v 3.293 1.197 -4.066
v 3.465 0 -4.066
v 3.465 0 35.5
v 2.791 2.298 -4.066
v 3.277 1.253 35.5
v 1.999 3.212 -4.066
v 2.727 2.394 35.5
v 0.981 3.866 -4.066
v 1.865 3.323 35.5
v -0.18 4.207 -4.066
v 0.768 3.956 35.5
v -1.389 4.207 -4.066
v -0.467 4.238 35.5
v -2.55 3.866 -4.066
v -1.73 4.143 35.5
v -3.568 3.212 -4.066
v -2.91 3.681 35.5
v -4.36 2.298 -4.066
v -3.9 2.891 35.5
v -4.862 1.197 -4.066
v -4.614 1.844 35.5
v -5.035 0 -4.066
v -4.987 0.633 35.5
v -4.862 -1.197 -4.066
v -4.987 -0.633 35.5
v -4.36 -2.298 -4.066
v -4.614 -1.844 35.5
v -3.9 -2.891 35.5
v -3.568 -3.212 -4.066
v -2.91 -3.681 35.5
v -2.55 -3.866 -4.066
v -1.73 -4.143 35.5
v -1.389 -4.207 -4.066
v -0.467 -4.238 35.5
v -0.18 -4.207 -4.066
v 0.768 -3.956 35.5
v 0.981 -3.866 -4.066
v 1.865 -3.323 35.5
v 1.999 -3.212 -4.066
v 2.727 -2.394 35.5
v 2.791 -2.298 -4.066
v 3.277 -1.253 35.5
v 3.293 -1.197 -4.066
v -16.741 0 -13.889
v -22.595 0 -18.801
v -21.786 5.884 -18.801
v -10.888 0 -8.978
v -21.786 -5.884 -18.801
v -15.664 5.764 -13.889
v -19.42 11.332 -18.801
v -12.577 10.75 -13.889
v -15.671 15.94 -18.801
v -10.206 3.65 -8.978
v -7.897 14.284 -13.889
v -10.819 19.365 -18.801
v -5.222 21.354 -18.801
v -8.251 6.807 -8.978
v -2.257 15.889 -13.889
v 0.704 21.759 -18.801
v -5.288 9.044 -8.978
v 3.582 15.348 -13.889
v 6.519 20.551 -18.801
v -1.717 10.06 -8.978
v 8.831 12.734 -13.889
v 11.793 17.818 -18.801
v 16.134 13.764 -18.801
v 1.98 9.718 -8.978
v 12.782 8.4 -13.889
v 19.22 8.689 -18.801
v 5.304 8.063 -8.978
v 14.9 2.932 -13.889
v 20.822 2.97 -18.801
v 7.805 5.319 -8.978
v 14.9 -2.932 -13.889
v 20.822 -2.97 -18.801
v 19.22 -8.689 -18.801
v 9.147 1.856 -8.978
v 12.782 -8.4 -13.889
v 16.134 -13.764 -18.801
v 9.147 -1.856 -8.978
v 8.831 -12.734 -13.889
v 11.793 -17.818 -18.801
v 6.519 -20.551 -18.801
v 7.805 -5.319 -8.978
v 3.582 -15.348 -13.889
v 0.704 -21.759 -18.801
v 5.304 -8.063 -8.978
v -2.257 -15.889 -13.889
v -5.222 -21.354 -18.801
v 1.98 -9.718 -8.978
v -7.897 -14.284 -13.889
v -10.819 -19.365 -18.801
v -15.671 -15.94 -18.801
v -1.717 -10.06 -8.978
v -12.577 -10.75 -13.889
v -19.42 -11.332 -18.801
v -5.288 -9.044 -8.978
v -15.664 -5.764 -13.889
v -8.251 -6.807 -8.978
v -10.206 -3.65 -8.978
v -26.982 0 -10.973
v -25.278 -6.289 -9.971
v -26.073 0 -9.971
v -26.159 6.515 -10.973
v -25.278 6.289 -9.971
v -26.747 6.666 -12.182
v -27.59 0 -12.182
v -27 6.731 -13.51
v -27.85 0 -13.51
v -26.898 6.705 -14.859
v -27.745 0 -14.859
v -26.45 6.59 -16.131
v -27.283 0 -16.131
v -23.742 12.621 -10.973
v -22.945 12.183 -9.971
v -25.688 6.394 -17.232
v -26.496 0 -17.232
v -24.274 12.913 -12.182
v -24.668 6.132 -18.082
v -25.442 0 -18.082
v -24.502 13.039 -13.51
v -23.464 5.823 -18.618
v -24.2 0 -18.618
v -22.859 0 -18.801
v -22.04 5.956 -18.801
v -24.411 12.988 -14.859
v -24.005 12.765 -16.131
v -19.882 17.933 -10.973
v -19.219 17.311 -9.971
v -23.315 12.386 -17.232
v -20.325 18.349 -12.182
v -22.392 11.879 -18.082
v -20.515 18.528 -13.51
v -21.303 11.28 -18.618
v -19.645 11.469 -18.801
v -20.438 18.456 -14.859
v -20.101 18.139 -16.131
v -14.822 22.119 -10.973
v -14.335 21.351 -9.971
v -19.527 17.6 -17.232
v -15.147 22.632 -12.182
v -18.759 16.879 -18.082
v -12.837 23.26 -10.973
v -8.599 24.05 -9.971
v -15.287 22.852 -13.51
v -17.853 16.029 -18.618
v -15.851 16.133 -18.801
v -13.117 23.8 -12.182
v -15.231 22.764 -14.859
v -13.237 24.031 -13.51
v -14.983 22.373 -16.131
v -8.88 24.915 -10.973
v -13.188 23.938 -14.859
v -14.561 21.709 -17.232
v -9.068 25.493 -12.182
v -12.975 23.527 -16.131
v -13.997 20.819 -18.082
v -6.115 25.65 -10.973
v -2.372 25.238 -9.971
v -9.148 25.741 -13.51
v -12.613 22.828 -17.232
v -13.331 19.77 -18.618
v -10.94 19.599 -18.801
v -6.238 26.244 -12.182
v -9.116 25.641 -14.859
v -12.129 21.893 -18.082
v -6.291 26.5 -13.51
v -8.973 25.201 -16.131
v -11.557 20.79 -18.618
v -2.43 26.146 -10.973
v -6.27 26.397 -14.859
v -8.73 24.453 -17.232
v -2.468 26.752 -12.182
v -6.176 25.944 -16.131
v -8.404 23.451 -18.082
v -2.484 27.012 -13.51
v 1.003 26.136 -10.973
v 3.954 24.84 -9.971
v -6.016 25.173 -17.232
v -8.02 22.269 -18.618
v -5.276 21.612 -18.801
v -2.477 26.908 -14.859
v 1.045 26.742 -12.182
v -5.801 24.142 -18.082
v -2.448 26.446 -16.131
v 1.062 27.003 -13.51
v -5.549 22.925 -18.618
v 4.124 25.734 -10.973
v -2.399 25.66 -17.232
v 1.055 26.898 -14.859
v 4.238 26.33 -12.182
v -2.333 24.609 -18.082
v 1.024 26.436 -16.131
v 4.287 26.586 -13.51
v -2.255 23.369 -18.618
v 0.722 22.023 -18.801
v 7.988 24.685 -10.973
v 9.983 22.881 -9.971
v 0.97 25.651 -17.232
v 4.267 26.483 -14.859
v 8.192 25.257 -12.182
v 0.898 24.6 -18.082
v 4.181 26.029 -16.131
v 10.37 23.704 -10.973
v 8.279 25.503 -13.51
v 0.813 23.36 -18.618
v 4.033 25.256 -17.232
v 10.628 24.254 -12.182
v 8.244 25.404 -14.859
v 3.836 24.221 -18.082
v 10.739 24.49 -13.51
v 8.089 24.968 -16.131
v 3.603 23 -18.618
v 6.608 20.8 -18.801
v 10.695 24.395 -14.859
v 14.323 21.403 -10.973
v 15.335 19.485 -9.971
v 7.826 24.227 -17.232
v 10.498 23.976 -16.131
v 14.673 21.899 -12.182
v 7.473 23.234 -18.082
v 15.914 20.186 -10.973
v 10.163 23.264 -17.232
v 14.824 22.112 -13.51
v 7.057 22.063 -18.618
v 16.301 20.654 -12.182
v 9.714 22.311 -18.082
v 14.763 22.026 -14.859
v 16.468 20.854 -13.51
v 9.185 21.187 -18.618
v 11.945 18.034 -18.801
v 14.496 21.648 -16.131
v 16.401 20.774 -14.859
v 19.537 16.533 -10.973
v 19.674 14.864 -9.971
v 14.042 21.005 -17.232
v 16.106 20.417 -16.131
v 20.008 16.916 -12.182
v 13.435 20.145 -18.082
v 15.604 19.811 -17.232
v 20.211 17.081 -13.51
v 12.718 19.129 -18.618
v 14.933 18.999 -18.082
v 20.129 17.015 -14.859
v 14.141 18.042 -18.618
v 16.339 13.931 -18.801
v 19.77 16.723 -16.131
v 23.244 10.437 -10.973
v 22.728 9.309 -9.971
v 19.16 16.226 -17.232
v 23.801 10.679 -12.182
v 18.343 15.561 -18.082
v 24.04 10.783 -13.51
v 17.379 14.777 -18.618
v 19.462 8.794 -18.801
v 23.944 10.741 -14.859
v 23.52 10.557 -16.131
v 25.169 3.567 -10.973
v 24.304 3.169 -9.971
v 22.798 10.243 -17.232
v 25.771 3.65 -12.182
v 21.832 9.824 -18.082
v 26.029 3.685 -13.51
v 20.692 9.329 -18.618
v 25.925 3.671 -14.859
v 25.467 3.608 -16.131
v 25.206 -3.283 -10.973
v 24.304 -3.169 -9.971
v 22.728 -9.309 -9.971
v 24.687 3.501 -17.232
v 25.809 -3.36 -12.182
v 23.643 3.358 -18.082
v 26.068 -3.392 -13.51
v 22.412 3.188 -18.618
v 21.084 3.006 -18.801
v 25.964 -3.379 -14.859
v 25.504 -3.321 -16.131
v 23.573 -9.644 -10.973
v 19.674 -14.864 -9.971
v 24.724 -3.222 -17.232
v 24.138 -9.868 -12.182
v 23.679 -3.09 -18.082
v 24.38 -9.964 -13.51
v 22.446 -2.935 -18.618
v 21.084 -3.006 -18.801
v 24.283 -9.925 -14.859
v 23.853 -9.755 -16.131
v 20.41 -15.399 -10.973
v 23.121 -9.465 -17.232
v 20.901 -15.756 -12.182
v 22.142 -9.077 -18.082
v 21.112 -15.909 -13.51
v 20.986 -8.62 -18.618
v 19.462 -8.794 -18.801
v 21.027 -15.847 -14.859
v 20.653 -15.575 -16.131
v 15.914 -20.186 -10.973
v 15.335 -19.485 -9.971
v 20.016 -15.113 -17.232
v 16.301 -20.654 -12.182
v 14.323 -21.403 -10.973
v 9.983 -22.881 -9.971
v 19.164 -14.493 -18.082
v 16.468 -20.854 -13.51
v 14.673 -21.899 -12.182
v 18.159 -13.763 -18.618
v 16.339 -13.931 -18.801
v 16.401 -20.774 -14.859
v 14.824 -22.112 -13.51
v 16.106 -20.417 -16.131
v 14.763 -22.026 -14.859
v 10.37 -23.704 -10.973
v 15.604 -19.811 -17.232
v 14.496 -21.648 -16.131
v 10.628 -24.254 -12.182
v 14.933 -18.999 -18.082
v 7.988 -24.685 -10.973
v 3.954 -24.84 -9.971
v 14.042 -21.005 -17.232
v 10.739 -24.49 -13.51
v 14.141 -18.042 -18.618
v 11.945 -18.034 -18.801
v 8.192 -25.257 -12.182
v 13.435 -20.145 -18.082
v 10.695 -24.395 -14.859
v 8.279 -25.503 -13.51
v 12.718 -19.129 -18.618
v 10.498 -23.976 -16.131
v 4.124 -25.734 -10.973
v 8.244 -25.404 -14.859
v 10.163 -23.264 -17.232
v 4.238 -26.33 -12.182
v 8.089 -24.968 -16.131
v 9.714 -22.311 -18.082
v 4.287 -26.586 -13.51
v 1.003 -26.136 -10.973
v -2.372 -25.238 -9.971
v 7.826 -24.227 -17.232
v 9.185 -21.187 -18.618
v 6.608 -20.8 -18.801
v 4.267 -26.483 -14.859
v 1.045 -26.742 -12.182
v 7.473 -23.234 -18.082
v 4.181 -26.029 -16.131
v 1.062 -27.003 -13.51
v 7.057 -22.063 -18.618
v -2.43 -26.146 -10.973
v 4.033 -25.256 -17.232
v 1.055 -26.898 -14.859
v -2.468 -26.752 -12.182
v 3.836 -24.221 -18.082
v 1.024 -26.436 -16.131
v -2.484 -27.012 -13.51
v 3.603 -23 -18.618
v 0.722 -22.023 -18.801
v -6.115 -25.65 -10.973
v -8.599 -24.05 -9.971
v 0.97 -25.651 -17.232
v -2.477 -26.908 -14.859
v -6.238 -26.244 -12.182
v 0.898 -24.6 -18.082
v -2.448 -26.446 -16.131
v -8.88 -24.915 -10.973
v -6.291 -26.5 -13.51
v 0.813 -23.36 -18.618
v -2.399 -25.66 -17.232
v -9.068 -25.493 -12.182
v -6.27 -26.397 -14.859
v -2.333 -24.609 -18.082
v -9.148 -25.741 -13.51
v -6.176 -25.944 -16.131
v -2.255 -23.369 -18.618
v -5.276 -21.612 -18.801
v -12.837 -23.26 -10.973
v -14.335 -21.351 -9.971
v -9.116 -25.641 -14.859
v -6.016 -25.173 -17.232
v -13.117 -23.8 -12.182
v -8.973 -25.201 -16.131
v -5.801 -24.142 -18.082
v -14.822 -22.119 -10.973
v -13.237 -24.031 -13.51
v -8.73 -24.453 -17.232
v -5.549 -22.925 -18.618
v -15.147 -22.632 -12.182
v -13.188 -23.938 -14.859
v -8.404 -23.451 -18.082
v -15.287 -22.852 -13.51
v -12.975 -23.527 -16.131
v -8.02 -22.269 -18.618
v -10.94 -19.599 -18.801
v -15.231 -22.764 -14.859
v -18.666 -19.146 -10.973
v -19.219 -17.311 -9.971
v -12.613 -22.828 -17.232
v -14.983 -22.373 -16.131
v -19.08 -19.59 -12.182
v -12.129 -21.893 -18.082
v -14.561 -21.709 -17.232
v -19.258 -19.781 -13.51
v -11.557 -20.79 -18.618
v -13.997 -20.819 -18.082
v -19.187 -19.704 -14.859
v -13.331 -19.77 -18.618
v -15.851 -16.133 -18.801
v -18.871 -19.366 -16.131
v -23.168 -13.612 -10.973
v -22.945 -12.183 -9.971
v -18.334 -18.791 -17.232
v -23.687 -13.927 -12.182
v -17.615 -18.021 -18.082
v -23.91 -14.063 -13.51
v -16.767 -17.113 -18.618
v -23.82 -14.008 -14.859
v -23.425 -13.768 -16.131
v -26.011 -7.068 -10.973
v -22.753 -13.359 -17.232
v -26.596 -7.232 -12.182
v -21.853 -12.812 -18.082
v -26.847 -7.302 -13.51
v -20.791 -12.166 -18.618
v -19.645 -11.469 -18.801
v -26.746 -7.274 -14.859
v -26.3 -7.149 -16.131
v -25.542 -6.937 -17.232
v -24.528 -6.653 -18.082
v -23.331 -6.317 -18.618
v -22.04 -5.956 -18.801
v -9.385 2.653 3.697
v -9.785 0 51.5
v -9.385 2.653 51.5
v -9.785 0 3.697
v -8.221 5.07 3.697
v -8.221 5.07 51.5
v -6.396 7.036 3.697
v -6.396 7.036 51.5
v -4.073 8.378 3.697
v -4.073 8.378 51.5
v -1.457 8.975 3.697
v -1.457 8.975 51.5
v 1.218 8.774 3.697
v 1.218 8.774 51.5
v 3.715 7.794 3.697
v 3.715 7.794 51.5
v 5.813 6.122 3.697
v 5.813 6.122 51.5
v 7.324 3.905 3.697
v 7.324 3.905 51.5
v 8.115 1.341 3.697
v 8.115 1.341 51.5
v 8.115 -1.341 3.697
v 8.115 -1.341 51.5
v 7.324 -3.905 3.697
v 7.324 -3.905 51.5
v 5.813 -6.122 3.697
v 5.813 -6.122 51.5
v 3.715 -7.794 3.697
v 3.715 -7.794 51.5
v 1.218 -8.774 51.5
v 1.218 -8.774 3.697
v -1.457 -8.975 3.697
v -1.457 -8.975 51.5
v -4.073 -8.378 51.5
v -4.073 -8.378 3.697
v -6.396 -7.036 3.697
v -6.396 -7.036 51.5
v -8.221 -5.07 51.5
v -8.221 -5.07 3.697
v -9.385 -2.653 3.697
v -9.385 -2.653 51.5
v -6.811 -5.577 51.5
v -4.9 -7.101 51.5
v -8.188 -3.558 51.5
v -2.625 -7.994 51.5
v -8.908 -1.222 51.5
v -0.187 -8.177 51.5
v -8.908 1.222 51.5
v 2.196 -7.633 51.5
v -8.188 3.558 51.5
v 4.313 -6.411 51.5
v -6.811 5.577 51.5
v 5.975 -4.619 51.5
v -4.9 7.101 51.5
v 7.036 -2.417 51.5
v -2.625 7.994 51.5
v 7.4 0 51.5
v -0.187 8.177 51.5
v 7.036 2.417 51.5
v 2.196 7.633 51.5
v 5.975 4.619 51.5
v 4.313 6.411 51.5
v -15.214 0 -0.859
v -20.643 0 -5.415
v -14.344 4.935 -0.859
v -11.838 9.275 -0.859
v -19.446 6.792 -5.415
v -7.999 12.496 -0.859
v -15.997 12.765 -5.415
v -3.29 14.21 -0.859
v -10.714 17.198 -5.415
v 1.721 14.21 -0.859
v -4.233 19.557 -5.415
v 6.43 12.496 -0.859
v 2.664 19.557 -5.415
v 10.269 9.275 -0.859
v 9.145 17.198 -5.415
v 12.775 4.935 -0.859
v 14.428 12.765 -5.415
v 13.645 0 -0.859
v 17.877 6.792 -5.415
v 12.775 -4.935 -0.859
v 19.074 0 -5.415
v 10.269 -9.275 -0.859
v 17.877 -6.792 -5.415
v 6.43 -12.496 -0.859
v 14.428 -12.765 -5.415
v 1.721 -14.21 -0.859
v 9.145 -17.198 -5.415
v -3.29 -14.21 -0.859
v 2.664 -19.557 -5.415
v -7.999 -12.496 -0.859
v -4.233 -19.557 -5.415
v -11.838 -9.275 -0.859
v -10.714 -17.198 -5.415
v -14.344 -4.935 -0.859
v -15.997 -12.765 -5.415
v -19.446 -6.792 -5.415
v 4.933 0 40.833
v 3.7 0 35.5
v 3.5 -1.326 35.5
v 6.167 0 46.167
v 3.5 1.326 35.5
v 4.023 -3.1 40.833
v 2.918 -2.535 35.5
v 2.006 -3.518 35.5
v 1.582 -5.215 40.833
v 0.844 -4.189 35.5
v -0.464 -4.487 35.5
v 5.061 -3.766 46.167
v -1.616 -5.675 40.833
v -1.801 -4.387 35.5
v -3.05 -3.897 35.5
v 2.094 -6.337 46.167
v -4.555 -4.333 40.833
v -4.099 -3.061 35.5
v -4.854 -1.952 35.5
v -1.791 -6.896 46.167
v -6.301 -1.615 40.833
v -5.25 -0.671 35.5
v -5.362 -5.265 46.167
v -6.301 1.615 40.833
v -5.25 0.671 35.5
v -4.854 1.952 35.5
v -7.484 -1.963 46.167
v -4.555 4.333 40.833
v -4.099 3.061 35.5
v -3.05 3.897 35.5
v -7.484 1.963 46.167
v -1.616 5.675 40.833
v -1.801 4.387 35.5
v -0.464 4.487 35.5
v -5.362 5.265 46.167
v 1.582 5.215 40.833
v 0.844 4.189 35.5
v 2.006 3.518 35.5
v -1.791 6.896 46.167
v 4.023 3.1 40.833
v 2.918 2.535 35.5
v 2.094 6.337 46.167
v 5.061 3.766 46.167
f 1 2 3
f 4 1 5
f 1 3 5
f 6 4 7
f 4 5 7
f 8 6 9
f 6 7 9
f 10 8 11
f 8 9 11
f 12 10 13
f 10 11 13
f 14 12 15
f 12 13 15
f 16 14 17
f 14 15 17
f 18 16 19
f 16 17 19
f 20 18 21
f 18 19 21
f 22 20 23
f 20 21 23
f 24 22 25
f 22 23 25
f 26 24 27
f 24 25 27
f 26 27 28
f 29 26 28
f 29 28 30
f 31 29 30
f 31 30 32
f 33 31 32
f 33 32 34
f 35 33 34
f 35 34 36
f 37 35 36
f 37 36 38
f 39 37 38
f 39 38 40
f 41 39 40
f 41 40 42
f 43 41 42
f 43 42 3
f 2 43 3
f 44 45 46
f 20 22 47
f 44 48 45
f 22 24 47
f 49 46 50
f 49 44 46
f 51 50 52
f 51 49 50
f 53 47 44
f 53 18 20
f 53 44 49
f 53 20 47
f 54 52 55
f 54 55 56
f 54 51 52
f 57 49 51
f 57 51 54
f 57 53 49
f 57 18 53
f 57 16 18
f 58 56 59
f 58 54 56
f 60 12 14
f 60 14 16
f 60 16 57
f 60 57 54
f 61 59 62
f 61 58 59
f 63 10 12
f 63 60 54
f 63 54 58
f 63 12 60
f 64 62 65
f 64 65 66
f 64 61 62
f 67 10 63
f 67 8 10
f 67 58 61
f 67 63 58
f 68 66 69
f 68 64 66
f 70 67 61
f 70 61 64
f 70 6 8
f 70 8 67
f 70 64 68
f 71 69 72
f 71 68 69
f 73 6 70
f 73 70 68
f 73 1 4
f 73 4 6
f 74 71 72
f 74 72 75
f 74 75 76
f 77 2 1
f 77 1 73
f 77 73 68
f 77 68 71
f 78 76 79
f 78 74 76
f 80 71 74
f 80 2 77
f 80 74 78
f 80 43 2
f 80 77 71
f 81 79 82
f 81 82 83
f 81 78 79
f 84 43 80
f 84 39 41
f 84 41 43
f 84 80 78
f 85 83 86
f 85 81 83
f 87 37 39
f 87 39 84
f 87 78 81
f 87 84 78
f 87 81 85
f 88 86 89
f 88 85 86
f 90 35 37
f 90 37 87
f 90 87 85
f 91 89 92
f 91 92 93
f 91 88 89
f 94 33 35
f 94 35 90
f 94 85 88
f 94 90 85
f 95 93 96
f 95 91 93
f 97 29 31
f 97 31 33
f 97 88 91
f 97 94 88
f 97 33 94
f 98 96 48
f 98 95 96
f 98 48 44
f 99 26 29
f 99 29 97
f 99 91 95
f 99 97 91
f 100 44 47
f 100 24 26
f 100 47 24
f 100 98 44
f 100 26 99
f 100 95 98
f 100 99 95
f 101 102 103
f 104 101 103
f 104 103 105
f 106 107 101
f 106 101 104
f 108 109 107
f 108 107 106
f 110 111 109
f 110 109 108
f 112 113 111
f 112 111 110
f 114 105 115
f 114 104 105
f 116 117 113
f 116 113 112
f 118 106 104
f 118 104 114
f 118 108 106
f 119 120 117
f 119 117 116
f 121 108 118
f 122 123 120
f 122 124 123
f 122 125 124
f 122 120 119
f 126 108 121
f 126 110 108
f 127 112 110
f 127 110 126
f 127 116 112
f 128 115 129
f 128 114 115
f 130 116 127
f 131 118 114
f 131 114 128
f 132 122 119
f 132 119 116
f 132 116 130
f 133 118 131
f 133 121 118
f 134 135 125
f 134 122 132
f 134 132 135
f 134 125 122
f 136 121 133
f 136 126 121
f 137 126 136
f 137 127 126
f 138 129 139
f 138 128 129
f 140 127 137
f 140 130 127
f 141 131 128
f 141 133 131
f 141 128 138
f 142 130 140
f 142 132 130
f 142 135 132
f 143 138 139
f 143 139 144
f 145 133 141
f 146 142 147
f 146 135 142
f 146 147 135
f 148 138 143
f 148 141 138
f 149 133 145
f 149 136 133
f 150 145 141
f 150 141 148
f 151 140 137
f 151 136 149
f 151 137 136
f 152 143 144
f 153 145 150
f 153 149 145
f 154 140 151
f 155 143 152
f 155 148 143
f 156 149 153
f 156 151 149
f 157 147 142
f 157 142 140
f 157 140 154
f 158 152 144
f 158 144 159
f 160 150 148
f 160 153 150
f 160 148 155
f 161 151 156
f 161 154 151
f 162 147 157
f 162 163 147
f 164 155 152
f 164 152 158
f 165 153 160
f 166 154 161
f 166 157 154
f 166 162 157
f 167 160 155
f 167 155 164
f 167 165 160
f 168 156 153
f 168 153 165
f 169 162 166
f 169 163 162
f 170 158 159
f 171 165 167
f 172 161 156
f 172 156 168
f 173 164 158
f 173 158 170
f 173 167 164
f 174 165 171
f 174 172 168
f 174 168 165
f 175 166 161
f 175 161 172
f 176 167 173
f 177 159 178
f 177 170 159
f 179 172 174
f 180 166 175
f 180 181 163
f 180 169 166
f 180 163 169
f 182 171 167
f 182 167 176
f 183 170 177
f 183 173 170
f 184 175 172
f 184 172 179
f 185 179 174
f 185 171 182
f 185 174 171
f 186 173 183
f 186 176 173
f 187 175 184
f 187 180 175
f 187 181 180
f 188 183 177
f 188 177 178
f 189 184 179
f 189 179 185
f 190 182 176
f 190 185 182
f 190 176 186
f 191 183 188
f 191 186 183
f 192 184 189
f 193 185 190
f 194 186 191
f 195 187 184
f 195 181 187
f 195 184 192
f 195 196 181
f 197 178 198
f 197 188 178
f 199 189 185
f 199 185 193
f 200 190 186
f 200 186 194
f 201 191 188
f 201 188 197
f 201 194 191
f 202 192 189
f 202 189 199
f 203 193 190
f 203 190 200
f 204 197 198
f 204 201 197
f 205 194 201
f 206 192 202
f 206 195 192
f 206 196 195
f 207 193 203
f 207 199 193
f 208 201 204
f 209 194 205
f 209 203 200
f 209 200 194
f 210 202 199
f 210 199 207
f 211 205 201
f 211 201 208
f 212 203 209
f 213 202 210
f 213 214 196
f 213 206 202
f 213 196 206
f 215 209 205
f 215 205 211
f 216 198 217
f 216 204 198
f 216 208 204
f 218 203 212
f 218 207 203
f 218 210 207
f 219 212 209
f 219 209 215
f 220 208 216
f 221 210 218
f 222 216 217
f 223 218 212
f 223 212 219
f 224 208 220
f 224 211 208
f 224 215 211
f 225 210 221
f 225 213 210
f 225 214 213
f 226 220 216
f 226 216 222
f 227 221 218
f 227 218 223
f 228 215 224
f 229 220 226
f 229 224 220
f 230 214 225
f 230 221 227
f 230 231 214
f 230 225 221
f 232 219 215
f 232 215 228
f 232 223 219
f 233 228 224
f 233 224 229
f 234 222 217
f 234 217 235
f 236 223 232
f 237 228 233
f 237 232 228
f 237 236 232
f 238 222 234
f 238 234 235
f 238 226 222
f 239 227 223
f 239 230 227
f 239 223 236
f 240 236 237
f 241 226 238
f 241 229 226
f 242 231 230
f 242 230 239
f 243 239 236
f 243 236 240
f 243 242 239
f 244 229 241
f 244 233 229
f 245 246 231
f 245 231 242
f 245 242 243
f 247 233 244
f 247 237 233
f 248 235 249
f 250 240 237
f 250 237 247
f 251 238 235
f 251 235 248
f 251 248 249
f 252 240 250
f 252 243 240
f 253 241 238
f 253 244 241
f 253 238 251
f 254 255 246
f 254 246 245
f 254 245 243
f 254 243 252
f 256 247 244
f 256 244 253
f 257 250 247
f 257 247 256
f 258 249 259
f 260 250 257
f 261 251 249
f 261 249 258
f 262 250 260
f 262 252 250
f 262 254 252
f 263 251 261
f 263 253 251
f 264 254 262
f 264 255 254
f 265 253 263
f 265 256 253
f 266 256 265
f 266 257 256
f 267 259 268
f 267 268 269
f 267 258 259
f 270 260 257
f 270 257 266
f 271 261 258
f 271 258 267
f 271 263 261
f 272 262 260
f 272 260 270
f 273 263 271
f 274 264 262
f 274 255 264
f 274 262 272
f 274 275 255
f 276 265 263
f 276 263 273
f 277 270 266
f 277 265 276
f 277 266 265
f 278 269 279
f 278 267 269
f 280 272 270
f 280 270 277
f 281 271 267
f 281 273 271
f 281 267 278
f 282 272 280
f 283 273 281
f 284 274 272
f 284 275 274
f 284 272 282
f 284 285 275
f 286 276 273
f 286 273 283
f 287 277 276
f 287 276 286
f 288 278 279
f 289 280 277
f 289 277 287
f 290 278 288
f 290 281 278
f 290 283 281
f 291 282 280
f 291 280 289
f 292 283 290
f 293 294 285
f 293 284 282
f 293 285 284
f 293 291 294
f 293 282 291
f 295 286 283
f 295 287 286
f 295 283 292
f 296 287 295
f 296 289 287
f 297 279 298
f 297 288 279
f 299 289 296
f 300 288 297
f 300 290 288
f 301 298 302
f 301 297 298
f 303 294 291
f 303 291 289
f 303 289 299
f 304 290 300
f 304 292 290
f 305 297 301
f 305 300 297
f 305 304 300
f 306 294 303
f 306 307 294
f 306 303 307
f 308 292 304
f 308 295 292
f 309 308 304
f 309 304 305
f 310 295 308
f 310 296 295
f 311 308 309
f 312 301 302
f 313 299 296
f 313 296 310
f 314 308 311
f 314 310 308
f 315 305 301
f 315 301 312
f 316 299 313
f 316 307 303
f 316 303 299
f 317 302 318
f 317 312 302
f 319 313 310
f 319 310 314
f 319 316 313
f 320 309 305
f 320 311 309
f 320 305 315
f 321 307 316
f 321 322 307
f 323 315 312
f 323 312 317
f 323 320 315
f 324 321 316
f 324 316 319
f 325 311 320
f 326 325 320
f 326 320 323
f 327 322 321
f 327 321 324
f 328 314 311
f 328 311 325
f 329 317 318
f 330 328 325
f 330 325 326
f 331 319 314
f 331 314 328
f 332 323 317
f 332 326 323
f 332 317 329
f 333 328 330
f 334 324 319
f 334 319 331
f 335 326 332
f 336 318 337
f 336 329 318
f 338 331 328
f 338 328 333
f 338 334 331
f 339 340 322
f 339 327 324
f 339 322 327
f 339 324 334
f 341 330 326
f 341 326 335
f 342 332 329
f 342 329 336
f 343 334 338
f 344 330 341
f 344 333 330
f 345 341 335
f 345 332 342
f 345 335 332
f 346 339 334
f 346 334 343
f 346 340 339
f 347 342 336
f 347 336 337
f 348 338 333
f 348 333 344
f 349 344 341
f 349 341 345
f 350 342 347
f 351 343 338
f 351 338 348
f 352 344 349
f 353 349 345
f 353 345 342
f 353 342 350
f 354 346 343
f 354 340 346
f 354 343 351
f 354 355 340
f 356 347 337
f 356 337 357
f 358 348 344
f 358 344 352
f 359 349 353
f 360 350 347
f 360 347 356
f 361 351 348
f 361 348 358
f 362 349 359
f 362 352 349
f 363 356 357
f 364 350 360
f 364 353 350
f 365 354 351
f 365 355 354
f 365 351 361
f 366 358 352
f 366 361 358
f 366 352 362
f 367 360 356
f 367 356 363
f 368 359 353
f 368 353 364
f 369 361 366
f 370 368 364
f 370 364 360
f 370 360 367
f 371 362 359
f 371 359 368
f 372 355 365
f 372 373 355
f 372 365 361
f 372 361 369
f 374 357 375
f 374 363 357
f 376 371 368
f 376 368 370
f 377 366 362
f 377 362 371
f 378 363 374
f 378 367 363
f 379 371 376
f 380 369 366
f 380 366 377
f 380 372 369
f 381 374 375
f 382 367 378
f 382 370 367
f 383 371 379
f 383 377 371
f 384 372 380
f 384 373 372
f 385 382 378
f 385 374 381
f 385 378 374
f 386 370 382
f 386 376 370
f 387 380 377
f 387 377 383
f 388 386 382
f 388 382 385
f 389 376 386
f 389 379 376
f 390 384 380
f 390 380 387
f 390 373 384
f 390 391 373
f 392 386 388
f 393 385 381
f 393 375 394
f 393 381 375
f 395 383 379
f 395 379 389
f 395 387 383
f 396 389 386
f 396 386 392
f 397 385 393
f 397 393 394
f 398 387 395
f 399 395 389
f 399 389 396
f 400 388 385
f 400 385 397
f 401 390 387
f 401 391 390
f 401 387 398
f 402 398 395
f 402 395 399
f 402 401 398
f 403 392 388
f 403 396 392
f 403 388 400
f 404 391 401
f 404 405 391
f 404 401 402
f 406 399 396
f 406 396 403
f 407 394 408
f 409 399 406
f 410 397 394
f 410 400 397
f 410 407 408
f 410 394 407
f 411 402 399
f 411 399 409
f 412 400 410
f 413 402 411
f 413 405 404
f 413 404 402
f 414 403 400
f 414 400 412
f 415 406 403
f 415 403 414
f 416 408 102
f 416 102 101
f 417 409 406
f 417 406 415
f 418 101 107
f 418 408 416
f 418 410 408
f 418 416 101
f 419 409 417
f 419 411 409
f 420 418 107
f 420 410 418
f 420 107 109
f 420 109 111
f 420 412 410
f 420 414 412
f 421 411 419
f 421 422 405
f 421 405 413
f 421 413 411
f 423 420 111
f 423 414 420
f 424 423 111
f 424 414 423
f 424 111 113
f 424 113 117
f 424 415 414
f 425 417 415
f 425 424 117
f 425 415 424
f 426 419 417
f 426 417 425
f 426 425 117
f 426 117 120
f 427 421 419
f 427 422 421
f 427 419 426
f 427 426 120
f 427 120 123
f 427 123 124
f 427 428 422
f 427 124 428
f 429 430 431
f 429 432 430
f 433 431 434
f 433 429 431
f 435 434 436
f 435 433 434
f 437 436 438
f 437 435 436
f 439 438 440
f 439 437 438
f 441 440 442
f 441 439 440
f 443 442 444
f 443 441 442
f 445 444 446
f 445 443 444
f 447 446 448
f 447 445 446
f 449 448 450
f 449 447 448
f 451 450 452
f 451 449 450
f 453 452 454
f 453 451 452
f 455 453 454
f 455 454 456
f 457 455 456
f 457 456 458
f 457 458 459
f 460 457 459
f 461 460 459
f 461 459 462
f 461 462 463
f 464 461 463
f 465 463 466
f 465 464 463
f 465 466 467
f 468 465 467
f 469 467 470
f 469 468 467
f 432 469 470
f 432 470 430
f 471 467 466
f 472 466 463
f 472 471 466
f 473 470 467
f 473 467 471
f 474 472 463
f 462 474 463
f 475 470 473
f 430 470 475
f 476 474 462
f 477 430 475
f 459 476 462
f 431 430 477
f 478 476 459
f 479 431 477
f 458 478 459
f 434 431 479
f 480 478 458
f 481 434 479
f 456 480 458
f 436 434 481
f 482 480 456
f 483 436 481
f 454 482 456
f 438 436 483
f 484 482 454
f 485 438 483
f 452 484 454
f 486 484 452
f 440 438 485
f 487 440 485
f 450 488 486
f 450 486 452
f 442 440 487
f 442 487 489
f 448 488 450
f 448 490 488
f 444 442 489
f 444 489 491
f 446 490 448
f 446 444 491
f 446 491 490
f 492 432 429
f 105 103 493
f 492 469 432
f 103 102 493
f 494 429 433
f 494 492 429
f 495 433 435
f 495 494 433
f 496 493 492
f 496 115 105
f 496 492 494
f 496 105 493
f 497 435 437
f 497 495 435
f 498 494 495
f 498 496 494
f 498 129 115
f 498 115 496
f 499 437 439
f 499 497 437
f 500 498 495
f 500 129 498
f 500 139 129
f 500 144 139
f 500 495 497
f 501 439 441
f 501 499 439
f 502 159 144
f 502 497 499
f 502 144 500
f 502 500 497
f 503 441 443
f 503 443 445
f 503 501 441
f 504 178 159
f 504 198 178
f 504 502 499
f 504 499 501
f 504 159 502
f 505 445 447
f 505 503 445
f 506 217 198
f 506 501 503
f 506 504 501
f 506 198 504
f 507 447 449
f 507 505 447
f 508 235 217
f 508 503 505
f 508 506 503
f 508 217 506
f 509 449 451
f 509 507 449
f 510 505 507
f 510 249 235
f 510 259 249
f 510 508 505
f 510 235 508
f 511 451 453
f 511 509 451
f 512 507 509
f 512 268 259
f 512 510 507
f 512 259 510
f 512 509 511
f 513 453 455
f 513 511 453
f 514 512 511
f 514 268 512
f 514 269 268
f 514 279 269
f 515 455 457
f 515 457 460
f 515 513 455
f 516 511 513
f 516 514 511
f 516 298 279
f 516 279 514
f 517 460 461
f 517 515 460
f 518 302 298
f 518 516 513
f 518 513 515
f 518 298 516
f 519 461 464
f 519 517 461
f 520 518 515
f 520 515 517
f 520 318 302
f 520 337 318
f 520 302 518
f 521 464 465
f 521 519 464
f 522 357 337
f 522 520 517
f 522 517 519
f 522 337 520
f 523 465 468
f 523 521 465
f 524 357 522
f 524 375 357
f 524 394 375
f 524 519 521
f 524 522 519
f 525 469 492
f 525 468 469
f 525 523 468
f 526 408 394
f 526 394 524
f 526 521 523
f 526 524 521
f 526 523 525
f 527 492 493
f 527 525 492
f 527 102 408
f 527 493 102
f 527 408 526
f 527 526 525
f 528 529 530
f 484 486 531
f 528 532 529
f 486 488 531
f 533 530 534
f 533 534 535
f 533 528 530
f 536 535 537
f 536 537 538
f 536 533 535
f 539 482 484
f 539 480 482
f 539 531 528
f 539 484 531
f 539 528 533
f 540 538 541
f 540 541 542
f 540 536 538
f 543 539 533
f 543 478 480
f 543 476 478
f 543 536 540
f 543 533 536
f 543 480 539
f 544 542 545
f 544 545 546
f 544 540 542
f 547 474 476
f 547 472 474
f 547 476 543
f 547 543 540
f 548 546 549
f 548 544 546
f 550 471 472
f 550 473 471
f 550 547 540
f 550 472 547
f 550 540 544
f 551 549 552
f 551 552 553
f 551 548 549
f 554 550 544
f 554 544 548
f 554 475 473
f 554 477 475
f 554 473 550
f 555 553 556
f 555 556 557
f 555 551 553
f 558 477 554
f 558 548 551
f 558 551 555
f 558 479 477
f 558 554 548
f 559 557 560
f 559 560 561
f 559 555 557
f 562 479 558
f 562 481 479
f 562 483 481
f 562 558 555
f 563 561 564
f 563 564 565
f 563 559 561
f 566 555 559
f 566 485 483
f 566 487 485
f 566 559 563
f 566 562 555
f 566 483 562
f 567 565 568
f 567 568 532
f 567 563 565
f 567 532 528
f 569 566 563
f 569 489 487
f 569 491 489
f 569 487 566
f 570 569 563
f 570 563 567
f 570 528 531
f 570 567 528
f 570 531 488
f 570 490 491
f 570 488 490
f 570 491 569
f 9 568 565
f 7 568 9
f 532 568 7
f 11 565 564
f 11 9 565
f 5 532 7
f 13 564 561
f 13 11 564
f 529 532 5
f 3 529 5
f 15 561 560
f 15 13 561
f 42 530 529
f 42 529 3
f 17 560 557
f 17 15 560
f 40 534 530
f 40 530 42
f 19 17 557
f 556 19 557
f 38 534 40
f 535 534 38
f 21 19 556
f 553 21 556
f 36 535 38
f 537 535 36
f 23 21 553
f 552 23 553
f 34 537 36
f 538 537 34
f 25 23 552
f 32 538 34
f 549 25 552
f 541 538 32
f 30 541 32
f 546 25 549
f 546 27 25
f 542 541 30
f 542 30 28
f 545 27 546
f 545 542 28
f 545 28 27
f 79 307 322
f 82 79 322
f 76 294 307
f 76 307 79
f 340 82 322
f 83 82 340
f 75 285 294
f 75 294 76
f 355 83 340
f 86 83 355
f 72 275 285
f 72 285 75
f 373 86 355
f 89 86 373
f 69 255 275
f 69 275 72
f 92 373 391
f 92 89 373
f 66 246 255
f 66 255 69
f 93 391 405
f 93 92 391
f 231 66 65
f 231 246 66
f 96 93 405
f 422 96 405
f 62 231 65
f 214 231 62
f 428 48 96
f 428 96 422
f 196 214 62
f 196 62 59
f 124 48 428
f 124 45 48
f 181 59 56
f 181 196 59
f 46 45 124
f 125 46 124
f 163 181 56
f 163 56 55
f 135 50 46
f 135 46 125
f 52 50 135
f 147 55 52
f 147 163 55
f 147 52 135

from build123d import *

# Parameters (mm, degrees)
F2_R     = 5
F3_R     = 4.25
F4_DEPTH = 70


with BuildPart() as f1:
    # F0 (on Front) → F1 (revolve)
    with BuildSketch(Plane.XZ):
        with BuildLine():
            Line((-0.7845937077, 51.5), (-9.7845937077, 51.5))
            Line((-9.7845937077, 51.5), (-9.7845937077, 3.6967689234))
            Line((-9.7845937077, 3.6967689234), (-36.5961492169, -18.8007974156))
            Line((-36.5961492169, -18.8007974156), (-22.5946347751, -18.8007974156))
            Line((-22.5946347751, -18.8007974156), (-2.5706556593, -1.9986839248))
            ThreePointArc((-2.5706556593, -1.9986839248), (-1.2530547725, -0.2815530179), (-0.7845937077, 1.8315382908))
            Line((-0.7845937077, 1.8315382908), (-0.7845937077, 51.5))
        make_face()
    revolve(axis=Axis((-0.7845937077, 0, 26.6657691454), (0, 0, -1)))

    # F2
    f2_edges = [f1.edges().sort_by_distance(p)[0] for p in [
        (35.026962, 0, -18.800797),
    ]]
    fillet(f2_edges, radius=F2_R)

    # F3 (on face) → F4 (cut)
    with BuildSketch(Plane.XY.offset(51.5)):
        with Locations((-0.7845937077, 0)):
            Circle(F3_R)
    extrude(amount=-F4_DEPTH, mode=Mode.SUBTRACT)

    # F5 (on Front) → F6 (revolve, cut)
    with BuildSketch(Plane.XZ):
        Polygon((7.4, 51.5), (-0.8, 51.5), (-0.8, 35.5), (3.7, 35.5), align=None)
    revolve(axis=Axis((-0.8, 0, 43.5), (0, 0, -1)), mode=Mode.SUBTRACT)


solid = f1.part
